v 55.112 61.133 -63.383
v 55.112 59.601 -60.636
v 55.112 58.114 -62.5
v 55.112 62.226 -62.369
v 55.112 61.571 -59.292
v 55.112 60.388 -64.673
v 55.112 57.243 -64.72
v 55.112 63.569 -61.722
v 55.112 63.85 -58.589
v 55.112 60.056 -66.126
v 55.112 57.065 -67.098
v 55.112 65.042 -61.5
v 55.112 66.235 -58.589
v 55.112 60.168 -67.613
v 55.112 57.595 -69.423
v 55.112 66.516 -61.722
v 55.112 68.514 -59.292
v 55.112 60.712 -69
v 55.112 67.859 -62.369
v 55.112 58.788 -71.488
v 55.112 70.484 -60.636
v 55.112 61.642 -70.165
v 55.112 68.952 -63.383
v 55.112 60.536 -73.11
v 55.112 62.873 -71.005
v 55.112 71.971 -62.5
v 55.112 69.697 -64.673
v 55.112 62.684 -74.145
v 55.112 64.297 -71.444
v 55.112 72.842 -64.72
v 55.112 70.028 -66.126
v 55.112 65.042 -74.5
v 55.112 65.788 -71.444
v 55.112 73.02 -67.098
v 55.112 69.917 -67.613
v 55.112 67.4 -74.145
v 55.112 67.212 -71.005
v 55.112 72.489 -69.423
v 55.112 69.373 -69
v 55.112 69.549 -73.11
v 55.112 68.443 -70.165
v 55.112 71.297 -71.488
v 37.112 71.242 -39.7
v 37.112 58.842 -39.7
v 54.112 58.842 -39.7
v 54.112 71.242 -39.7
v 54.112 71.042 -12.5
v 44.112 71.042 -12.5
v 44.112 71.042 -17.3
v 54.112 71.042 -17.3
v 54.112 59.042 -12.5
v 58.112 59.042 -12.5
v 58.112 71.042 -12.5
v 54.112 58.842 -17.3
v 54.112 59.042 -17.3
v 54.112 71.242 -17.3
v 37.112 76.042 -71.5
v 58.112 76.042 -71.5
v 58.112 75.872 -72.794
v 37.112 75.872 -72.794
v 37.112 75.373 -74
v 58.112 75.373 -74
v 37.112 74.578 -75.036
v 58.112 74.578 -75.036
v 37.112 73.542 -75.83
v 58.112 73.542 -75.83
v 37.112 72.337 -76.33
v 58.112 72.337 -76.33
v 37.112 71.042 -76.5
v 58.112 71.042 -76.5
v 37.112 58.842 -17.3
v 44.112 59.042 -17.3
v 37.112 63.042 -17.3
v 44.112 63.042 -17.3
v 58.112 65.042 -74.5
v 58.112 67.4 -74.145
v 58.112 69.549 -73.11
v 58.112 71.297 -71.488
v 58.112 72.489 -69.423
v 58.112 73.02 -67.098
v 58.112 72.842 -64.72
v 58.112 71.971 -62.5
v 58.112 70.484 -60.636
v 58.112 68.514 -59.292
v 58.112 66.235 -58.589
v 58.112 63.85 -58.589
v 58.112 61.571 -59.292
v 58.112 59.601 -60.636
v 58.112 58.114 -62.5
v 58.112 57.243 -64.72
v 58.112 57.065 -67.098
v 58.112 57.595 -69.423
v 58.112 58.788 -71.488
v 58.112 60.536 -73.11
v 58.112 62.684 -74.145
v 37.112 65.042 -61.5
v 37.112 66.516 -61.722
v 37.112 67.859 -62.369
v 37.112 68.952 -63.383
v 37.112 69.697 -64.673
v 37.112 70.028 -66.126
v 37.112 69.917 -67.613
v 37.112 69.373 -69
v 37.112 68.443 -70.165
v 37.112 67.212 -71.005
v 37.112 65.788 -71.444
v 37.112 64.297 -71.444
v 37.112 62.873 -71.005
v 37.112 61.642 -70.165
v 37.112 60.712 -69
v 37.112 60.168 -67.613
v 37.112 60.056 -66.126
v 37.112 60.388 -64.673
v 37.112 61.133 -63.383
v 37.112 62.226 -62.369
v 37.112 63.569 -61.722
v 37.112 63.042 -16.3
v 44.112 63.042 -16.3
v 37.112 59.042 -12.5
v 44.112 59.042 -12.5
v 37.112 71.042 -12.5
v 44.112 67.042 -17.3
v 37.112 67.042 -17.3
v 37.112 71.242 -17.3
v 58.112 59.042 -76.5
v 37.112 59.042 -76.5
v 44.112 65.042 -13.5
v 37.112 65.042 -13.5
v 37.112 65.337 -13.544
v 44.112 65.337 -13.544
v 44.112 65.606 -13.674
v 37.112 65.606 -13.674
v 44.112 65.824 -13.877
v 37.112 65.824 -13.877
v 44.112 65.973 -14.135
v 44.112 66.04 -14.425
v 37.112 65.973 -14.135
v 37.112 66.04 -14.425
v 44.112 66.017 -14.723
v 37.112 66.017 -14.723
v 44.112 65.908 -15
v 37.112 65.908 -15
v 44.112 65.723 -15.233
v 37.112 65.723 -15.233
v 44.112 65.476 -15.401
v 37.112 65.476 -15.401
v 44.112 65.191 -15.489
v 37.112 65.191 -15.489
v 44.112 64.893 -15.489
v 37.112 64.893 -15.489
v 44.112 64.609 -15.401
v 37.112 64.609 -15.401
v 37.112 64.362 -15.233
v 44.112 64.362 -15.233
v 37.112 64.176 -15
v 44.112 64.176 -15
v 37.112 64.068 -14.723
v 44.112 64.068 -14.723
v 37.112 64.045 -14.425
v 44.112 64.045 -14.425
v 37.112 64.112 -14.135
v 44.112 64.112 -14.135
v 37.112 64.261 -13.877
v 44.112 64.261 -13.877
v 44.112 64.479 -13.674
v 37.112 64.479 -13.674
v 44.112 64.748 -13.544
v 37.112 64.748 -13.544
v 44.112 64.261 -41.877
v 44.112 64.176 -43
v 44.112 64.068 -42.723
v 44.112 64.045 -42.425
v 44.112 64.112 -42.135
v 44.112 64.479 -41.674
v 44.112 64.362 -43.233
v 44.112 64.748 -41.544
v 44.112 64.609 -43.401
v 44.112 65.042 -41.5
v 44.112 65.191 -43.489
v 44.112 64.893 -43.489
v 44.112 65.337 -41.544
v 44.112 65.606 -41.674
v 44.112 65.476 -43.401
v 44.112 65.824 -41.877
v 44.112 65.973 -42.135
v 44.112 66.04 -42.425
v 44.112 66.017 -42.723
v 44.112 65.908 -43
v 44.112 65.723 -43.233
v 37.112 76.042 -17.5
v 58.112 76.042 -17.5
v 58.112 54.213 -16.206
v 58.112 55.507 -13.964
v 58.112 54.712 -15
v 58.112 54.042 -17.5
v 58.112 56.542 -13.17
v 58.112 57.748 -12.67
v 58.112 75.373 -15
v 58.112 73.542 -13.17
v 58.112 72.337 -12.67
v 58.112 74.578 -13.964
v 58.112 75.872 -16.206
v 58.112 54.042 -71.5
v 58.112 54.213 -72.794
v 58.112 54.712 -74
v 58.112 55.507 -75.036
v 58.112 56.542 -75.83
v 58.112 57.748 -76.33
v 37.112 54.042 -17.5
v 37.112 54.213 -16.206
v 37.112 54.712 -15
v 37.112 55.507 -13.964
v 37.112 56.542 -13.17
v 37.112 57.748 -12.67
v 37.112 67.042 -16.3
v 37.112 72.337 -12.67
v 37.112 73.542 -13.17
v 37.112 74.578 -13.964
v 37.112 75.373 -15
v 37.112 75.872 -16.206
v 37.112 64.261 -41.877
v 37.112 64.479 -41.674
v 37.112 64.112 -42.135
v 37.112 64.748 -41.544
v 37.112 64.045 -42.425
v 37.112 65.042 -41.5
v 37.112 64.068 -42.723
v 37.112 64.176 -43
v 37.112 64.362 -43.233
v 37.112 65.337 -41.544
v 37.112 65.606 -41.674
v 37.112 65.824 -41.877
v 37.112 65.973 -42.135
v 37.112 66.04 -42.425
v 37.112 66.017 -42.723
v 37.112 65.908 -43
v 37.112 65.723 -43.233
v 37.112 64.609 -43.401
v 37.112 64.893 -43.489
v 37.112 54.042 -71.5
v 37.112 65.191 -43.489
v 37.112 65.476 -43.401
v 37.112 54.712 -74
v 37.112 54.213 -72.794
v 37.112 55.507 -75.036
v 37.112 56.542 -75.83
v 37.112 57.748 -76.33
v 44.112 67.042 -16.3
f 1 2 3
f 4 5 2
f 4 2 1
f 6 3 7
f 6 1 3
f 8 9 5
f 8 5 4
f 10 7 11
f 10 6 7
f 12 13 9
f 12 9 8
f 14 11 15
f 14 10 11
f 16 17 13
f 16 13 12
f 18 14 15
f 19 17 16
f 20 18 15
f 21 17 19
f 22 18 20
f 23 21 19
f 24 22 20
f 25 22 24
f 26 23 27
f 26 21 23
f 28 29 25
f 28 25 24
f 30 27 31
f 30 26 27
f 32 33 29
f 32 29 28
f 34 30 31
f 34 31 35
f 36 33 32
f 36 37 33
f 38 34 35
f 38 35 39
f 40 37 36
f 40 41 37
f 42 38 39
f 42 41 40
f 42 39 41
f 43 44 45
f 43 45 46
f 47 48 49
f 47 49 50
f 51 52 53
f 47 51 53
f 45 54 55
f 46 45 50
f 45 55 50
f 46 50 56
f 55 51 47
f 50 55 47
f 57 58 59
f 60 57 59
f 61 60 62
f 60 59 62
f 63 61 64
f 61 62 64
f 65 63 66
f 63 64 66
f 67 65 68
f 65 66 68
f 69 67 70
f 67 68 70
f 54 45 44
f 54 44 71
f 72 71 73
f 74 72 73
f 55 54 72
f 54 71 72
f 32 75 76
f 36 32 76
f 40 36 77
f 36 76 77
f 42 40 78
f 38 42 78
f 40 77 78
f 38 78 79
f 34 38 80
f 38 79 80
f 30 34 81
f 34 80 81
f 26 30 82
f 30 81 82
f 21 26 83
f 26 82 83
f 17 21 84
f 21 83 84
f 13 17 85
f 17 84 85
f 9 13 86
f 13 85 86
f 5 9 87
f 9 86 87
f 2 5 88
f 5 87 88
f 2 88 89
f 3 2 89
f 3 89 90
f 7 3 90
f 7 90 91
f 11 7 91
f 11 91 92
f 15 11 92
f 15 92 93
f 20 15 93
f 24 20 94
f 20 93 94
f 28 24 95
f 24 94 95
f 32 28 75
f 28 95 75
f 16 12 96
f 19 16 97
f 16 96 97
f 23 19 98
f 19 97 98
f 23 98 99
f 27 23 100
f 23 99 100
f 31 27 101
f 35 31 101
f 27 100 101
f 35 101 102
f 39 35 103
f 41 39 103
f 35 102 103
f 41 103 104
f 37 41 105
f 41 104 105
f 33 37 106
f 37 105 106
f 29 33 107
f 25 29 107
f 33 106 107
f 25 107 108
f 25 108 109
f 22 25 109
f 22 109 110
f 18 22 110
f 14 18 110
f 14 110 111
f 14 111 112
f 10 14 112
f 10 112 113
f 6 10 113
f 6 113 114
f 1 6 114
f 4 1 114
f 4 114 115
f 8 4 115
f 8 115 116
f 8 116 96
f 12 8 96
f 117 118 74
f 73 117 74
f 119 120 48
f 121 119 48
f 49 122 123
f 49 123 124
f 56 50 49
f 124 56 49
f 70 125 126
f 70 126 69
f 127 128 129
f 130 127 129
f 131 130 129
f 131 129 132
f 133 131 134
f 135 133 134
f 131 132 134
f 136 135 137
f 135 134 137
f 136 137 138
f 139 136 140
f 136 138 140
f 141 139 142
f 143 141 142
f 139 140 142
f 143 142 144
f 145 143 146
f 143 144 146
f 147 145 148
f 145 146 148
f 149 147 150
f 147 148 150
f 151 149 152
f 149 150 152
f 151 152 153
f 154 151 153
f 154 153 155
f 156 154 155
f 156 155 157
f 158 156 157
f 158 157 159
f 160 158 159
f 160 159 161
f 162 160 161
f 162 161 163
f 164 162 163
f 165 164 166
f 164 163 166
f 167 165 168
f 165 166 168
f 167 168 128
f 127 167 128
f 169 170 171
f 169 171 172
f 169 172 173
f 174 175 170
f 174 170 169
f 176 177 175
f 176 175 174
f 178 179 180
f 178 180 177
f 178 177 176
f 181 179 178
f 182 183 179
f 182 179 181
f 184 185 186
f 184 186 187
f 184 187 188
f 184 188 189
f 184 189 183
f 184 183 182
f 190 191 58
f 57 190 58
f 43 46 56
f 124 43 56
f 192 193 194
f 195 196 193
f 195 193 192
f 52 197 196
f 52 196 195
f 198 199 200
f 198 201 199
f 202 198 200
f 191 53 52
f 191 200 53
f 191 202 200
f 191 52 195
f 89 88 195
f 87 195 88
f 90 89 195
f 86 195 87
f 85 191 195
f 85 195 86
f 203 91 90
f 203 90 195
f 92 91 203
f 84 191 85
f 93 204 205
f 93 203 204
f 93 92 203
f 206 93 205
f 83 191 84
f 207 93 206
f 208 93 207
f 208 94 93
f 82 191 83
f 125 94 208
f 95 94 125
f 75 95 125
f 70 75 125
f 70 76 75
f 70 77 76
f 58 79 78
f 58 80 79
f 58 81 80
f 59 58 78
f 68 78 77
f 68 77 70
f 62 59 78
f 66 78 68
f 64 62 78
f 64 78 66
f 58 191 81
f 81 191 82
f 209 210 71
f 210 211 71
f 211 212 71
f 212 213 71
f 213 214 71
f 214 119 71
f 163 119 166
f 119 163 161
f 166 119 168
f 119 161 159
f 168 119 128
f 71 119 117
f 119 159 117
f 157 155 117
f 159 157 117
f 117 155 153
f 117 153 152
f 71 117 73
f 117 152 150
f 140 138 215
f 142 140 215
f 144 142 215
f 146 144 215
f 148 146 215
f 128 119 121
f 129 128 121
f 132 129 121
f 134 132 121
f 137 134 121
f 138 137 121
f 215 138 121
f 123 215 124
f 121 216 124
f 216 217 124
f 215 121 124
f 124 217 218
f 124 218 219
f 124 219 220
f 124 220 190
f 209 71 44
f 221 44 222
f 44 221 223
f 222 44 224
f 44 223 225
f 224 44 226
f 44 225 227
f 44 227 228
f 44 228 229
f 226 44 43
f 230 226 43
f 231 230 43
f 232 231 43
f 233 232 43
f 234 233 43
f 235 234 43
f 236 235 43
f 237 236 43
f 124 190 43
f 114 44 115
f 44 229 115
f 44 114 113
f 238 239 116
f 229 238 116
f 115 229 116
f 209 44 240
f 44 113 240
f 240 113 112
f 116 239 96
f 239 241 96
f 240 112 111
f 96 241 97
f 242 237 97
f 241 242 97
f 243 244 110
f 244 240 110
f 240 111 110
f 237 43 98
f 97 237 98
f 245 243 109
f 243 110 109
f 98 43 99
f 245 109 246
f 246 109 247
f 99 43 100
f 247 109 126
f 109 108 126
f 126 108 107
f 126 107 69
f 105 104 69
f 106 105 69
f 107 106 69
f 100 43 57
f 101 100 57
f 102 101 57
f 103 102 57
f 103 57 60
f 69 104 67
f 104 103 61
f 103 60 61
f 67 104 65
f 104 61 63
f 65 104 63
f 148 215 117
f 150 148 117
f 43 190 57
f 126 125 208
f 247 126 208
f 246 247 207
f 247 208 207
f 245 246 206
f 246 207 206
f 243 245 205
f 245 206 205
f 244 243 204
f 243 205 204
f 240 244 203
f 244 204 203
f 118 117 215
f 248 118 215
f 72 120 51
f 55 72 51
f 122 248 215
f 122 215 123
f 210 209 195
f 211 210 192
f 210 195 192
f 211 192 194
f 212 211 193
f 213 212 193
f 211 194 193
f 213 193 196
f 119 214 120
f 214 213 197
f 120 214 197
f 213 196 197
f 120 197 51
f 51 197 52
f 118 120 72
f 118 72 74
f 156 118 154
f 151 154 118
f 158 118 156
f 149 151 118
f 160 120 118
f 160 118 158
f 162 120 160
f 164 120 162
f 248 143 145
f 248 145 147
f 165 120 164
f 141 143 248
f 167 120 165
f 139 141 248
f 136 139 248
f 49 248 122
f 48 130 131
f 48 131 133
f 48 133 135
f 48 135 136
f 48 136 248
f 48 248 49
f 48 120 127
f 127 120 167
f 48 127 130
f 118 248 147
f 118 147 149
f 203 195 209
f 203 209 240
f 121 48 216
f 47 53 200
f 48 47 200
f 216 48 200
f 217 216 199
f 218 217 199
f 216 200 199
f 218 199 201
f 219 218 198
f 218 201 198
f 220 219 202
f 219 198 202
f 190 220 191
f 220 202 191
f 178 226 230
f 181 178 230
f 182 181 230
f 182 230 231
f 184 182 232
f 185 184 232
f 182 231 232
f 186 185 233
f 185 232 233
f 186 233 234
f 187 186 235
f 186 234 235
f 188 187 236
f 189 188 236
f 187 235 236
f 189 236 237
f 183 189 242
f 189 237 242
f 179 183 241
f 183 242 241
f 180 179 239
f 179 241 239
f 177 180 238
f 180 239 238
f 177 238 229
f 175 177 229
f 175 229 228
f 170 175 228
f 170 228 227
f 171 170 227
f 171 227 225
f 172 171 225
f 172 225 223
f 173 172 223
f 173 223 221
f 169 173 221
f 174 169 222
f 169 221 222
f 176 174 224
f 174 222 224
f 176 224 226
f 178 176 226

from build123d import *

# Parameters (mm, degrees)
SKETCH1_W                = 64
SKETCH1_H                = 22
BOSS_EXTRUDE1_DEPTH      = 4
BOSS_EXTRUDE1_DEPTH_BACK = 17
SKETCH2_W                = 10
SKETCH2_H                = 12
CUT_EXTRUDE1_DEPTH       = 5
SKETCH3_R                = 1
CUT_EXTRUDE2_DEPTH       = 7
SKETCH4_R                = 5
CUT_EXTRUDE3_DEPTH       = 21
CUT_EXTRUDE4_START       = -17
SKETCH7_W                = 22.400000327
SKETCH7_H                = 12.400000179
CUT_EXTRUDE4_DEPTH       = 17
CUT_EXTRUDE5_REACH       = 9
SKETCH8_W                = 1
SKETCH8_H                = 4
CUT_EXTRUDE7_DEPTH       = 21
SKETCH9_R                = 8
CUT_EXTRUDE6_DEPTH       = 3


with BuildPart() as part:
    # Sketch1 → Boss-Extrude1 (new body, two sides)
    with BuildSketch(Plane(origin=(54.112238255, 0, 0), x_dir=(0, 0, -1), z_dir=(1, 0, 0))) as boss_extrude1_sk:
        with Locations((44.500000075, 65.042436513)):
            Rectangle(SKETCH1_W, SKETCH1_H)
    extrude(amount=BOSS_EXTRUDE1_DEPTH)
    extrude(boss_extrude1_sk.sketch, amount=-BOSS_EXTRUDE1_DEPTH_BACK)

    # Sketch2 → Cut-Extrude1 (cut)
    with BuildSketch(Plane.XY.offset(-12.500000075)):
        with Locations((49.112238255, 65.042436513)):
            Rectangle(SKETCH2_W, SKETCH2_H)
    extrude(amount=-CUT_EXTRUDE1_DEPTH, mode=Mode.SUBTRACT)

    # Sketch3 → Cut-Extrude2 (cut)
    with BuildSketch(Plane.ZY.offset(-37.112238255)):
        with Locations((-14.499999836, 65.042436513)):
            Circle(SKETCH3_R)
        with Locations((-42.500000313, 65.042436513)):
            Circle(SKETCH3_R)
    extrude(amount=-CUT_EXTRUDE2_DEPTH, mode=Mode.SUBTRACT)

    # Sketch4 → Cut-Extrude3 (cut)
    with BuildSketch(Plane.ZY.offset(-37.112238255)):
        with Locations((-66.500000075, 65.042436513)):
            Circle(SKETCH4_R)
    extrude(amount=-CUT_EXTRUDE3_DEPTH, mode=Mode.SUBTRACT)

    # Sketch7 → Cut-Extrude4 (cut)
    with BuildSketch(Plane.ZY.offset(-37.112238255).offset(CUT_EXTRUDE4_START)):
        with Locations((-28.500000075, 65.042436514)):
            Rectangle(SKETCH7_W, SKETCH7_H)
    extrude(amount=CUT_EXTRUDE4_DEPTH, mode=Mode.SUBTRACT)

    # Sketch8 → Cut-Extrude5 (cut, up to next)
    with BuildSketch(Plane(origin=(44.112238255, 0, 0), x_dir=(0, 0, -1), z_dir=(1, 0, 0)), mode=Mode.PRIVATE) as cut_extrude5_sk1:
        with Locations((16.799999911, 65.042436513)):
            Rectangle(SKETCH8_W, SKETCH8_H)
    cut_extrude5_tool1 = extrude(cut_extrude5_sk1.sketch, amount=-CUT_EXTRUDE5_REACH, mode=Mode.PRIVATE) & part.part
    add(cut_extrude5_tool1.solids().sort_by_distance((44.112238, 65.042437, -16.8))[0], mode=Mode.SUBTRACT)

    # Sketch10 → Cut-Extrude7 (cut)
    with BuildSketch(Plane(origin=(58.112238255, 0, 0), x_dir=(0, 0, -1), z_dir=(1, 0, 0))):
        with BuildLine():
            ThreePointArc((12.500000075, 71.042436513), (13.964466169, 74.577970419), (17.500000075, 76.042436513))
            Line((17.500000075, 76.042436513), (12.500000075, 76.042436513))
            Line((12.500000075, 76.042436513), (12.500000075, 71.042436513))
        make_face()
        with BuildLine():
            ThreePointArc((71.500000075, 76.042436513), (75.03553398, 74.577970419), (76.500000075, 71.042436513))
            Line((76.500000075, 71.042436513), (76.500000075, 76.042436513))
            Line((76.500000075, 76.042436513), (71.500000075, 76.042436513))
        make_face()
        with BuildLine():
            Line((76.500000075, 54.042436513), (76.500000075, 59.042436513))
            ThreePointArc((76.500000075, 59.042436513), (75.03553398, 55.506902607), (71.500000075, 54.042436513))
            Line((71.500000075, 54.042436513), (76.500000075, 54.042436513))
        make_face()
        with BuildLine():
            Line((12.500000075, 54.042436513), (17.500000075, 54.042436513))
            ThreePointArc((17.500000075, 54.042436513), (13.964466169, 55.506902607), (12.500000075, 59.042436513))
            Line((12.500000075, 59.042436513), (12.500000075, 54.042436513))
        make_face()
    extrude(amount=-CUT_EXTRUDE7_DEPTH, mode=Mode.SUBTRACT)

    # Sketch9 → Cut-Extrude6 (cut)
    with BuildSketch(Plane(origin=(58.112238255, 0, 0), x_dir=(0, 0, -1), z_dir=(1, 0, 0))):
        with Locations((66.500000075, 65.042436513)):
            Circle(SKETCH9_R)
    extrude(amount=-CUT_EXTRUDE6_DEPTH, mode=Mode.SUBTRACT)


solid = part.part
